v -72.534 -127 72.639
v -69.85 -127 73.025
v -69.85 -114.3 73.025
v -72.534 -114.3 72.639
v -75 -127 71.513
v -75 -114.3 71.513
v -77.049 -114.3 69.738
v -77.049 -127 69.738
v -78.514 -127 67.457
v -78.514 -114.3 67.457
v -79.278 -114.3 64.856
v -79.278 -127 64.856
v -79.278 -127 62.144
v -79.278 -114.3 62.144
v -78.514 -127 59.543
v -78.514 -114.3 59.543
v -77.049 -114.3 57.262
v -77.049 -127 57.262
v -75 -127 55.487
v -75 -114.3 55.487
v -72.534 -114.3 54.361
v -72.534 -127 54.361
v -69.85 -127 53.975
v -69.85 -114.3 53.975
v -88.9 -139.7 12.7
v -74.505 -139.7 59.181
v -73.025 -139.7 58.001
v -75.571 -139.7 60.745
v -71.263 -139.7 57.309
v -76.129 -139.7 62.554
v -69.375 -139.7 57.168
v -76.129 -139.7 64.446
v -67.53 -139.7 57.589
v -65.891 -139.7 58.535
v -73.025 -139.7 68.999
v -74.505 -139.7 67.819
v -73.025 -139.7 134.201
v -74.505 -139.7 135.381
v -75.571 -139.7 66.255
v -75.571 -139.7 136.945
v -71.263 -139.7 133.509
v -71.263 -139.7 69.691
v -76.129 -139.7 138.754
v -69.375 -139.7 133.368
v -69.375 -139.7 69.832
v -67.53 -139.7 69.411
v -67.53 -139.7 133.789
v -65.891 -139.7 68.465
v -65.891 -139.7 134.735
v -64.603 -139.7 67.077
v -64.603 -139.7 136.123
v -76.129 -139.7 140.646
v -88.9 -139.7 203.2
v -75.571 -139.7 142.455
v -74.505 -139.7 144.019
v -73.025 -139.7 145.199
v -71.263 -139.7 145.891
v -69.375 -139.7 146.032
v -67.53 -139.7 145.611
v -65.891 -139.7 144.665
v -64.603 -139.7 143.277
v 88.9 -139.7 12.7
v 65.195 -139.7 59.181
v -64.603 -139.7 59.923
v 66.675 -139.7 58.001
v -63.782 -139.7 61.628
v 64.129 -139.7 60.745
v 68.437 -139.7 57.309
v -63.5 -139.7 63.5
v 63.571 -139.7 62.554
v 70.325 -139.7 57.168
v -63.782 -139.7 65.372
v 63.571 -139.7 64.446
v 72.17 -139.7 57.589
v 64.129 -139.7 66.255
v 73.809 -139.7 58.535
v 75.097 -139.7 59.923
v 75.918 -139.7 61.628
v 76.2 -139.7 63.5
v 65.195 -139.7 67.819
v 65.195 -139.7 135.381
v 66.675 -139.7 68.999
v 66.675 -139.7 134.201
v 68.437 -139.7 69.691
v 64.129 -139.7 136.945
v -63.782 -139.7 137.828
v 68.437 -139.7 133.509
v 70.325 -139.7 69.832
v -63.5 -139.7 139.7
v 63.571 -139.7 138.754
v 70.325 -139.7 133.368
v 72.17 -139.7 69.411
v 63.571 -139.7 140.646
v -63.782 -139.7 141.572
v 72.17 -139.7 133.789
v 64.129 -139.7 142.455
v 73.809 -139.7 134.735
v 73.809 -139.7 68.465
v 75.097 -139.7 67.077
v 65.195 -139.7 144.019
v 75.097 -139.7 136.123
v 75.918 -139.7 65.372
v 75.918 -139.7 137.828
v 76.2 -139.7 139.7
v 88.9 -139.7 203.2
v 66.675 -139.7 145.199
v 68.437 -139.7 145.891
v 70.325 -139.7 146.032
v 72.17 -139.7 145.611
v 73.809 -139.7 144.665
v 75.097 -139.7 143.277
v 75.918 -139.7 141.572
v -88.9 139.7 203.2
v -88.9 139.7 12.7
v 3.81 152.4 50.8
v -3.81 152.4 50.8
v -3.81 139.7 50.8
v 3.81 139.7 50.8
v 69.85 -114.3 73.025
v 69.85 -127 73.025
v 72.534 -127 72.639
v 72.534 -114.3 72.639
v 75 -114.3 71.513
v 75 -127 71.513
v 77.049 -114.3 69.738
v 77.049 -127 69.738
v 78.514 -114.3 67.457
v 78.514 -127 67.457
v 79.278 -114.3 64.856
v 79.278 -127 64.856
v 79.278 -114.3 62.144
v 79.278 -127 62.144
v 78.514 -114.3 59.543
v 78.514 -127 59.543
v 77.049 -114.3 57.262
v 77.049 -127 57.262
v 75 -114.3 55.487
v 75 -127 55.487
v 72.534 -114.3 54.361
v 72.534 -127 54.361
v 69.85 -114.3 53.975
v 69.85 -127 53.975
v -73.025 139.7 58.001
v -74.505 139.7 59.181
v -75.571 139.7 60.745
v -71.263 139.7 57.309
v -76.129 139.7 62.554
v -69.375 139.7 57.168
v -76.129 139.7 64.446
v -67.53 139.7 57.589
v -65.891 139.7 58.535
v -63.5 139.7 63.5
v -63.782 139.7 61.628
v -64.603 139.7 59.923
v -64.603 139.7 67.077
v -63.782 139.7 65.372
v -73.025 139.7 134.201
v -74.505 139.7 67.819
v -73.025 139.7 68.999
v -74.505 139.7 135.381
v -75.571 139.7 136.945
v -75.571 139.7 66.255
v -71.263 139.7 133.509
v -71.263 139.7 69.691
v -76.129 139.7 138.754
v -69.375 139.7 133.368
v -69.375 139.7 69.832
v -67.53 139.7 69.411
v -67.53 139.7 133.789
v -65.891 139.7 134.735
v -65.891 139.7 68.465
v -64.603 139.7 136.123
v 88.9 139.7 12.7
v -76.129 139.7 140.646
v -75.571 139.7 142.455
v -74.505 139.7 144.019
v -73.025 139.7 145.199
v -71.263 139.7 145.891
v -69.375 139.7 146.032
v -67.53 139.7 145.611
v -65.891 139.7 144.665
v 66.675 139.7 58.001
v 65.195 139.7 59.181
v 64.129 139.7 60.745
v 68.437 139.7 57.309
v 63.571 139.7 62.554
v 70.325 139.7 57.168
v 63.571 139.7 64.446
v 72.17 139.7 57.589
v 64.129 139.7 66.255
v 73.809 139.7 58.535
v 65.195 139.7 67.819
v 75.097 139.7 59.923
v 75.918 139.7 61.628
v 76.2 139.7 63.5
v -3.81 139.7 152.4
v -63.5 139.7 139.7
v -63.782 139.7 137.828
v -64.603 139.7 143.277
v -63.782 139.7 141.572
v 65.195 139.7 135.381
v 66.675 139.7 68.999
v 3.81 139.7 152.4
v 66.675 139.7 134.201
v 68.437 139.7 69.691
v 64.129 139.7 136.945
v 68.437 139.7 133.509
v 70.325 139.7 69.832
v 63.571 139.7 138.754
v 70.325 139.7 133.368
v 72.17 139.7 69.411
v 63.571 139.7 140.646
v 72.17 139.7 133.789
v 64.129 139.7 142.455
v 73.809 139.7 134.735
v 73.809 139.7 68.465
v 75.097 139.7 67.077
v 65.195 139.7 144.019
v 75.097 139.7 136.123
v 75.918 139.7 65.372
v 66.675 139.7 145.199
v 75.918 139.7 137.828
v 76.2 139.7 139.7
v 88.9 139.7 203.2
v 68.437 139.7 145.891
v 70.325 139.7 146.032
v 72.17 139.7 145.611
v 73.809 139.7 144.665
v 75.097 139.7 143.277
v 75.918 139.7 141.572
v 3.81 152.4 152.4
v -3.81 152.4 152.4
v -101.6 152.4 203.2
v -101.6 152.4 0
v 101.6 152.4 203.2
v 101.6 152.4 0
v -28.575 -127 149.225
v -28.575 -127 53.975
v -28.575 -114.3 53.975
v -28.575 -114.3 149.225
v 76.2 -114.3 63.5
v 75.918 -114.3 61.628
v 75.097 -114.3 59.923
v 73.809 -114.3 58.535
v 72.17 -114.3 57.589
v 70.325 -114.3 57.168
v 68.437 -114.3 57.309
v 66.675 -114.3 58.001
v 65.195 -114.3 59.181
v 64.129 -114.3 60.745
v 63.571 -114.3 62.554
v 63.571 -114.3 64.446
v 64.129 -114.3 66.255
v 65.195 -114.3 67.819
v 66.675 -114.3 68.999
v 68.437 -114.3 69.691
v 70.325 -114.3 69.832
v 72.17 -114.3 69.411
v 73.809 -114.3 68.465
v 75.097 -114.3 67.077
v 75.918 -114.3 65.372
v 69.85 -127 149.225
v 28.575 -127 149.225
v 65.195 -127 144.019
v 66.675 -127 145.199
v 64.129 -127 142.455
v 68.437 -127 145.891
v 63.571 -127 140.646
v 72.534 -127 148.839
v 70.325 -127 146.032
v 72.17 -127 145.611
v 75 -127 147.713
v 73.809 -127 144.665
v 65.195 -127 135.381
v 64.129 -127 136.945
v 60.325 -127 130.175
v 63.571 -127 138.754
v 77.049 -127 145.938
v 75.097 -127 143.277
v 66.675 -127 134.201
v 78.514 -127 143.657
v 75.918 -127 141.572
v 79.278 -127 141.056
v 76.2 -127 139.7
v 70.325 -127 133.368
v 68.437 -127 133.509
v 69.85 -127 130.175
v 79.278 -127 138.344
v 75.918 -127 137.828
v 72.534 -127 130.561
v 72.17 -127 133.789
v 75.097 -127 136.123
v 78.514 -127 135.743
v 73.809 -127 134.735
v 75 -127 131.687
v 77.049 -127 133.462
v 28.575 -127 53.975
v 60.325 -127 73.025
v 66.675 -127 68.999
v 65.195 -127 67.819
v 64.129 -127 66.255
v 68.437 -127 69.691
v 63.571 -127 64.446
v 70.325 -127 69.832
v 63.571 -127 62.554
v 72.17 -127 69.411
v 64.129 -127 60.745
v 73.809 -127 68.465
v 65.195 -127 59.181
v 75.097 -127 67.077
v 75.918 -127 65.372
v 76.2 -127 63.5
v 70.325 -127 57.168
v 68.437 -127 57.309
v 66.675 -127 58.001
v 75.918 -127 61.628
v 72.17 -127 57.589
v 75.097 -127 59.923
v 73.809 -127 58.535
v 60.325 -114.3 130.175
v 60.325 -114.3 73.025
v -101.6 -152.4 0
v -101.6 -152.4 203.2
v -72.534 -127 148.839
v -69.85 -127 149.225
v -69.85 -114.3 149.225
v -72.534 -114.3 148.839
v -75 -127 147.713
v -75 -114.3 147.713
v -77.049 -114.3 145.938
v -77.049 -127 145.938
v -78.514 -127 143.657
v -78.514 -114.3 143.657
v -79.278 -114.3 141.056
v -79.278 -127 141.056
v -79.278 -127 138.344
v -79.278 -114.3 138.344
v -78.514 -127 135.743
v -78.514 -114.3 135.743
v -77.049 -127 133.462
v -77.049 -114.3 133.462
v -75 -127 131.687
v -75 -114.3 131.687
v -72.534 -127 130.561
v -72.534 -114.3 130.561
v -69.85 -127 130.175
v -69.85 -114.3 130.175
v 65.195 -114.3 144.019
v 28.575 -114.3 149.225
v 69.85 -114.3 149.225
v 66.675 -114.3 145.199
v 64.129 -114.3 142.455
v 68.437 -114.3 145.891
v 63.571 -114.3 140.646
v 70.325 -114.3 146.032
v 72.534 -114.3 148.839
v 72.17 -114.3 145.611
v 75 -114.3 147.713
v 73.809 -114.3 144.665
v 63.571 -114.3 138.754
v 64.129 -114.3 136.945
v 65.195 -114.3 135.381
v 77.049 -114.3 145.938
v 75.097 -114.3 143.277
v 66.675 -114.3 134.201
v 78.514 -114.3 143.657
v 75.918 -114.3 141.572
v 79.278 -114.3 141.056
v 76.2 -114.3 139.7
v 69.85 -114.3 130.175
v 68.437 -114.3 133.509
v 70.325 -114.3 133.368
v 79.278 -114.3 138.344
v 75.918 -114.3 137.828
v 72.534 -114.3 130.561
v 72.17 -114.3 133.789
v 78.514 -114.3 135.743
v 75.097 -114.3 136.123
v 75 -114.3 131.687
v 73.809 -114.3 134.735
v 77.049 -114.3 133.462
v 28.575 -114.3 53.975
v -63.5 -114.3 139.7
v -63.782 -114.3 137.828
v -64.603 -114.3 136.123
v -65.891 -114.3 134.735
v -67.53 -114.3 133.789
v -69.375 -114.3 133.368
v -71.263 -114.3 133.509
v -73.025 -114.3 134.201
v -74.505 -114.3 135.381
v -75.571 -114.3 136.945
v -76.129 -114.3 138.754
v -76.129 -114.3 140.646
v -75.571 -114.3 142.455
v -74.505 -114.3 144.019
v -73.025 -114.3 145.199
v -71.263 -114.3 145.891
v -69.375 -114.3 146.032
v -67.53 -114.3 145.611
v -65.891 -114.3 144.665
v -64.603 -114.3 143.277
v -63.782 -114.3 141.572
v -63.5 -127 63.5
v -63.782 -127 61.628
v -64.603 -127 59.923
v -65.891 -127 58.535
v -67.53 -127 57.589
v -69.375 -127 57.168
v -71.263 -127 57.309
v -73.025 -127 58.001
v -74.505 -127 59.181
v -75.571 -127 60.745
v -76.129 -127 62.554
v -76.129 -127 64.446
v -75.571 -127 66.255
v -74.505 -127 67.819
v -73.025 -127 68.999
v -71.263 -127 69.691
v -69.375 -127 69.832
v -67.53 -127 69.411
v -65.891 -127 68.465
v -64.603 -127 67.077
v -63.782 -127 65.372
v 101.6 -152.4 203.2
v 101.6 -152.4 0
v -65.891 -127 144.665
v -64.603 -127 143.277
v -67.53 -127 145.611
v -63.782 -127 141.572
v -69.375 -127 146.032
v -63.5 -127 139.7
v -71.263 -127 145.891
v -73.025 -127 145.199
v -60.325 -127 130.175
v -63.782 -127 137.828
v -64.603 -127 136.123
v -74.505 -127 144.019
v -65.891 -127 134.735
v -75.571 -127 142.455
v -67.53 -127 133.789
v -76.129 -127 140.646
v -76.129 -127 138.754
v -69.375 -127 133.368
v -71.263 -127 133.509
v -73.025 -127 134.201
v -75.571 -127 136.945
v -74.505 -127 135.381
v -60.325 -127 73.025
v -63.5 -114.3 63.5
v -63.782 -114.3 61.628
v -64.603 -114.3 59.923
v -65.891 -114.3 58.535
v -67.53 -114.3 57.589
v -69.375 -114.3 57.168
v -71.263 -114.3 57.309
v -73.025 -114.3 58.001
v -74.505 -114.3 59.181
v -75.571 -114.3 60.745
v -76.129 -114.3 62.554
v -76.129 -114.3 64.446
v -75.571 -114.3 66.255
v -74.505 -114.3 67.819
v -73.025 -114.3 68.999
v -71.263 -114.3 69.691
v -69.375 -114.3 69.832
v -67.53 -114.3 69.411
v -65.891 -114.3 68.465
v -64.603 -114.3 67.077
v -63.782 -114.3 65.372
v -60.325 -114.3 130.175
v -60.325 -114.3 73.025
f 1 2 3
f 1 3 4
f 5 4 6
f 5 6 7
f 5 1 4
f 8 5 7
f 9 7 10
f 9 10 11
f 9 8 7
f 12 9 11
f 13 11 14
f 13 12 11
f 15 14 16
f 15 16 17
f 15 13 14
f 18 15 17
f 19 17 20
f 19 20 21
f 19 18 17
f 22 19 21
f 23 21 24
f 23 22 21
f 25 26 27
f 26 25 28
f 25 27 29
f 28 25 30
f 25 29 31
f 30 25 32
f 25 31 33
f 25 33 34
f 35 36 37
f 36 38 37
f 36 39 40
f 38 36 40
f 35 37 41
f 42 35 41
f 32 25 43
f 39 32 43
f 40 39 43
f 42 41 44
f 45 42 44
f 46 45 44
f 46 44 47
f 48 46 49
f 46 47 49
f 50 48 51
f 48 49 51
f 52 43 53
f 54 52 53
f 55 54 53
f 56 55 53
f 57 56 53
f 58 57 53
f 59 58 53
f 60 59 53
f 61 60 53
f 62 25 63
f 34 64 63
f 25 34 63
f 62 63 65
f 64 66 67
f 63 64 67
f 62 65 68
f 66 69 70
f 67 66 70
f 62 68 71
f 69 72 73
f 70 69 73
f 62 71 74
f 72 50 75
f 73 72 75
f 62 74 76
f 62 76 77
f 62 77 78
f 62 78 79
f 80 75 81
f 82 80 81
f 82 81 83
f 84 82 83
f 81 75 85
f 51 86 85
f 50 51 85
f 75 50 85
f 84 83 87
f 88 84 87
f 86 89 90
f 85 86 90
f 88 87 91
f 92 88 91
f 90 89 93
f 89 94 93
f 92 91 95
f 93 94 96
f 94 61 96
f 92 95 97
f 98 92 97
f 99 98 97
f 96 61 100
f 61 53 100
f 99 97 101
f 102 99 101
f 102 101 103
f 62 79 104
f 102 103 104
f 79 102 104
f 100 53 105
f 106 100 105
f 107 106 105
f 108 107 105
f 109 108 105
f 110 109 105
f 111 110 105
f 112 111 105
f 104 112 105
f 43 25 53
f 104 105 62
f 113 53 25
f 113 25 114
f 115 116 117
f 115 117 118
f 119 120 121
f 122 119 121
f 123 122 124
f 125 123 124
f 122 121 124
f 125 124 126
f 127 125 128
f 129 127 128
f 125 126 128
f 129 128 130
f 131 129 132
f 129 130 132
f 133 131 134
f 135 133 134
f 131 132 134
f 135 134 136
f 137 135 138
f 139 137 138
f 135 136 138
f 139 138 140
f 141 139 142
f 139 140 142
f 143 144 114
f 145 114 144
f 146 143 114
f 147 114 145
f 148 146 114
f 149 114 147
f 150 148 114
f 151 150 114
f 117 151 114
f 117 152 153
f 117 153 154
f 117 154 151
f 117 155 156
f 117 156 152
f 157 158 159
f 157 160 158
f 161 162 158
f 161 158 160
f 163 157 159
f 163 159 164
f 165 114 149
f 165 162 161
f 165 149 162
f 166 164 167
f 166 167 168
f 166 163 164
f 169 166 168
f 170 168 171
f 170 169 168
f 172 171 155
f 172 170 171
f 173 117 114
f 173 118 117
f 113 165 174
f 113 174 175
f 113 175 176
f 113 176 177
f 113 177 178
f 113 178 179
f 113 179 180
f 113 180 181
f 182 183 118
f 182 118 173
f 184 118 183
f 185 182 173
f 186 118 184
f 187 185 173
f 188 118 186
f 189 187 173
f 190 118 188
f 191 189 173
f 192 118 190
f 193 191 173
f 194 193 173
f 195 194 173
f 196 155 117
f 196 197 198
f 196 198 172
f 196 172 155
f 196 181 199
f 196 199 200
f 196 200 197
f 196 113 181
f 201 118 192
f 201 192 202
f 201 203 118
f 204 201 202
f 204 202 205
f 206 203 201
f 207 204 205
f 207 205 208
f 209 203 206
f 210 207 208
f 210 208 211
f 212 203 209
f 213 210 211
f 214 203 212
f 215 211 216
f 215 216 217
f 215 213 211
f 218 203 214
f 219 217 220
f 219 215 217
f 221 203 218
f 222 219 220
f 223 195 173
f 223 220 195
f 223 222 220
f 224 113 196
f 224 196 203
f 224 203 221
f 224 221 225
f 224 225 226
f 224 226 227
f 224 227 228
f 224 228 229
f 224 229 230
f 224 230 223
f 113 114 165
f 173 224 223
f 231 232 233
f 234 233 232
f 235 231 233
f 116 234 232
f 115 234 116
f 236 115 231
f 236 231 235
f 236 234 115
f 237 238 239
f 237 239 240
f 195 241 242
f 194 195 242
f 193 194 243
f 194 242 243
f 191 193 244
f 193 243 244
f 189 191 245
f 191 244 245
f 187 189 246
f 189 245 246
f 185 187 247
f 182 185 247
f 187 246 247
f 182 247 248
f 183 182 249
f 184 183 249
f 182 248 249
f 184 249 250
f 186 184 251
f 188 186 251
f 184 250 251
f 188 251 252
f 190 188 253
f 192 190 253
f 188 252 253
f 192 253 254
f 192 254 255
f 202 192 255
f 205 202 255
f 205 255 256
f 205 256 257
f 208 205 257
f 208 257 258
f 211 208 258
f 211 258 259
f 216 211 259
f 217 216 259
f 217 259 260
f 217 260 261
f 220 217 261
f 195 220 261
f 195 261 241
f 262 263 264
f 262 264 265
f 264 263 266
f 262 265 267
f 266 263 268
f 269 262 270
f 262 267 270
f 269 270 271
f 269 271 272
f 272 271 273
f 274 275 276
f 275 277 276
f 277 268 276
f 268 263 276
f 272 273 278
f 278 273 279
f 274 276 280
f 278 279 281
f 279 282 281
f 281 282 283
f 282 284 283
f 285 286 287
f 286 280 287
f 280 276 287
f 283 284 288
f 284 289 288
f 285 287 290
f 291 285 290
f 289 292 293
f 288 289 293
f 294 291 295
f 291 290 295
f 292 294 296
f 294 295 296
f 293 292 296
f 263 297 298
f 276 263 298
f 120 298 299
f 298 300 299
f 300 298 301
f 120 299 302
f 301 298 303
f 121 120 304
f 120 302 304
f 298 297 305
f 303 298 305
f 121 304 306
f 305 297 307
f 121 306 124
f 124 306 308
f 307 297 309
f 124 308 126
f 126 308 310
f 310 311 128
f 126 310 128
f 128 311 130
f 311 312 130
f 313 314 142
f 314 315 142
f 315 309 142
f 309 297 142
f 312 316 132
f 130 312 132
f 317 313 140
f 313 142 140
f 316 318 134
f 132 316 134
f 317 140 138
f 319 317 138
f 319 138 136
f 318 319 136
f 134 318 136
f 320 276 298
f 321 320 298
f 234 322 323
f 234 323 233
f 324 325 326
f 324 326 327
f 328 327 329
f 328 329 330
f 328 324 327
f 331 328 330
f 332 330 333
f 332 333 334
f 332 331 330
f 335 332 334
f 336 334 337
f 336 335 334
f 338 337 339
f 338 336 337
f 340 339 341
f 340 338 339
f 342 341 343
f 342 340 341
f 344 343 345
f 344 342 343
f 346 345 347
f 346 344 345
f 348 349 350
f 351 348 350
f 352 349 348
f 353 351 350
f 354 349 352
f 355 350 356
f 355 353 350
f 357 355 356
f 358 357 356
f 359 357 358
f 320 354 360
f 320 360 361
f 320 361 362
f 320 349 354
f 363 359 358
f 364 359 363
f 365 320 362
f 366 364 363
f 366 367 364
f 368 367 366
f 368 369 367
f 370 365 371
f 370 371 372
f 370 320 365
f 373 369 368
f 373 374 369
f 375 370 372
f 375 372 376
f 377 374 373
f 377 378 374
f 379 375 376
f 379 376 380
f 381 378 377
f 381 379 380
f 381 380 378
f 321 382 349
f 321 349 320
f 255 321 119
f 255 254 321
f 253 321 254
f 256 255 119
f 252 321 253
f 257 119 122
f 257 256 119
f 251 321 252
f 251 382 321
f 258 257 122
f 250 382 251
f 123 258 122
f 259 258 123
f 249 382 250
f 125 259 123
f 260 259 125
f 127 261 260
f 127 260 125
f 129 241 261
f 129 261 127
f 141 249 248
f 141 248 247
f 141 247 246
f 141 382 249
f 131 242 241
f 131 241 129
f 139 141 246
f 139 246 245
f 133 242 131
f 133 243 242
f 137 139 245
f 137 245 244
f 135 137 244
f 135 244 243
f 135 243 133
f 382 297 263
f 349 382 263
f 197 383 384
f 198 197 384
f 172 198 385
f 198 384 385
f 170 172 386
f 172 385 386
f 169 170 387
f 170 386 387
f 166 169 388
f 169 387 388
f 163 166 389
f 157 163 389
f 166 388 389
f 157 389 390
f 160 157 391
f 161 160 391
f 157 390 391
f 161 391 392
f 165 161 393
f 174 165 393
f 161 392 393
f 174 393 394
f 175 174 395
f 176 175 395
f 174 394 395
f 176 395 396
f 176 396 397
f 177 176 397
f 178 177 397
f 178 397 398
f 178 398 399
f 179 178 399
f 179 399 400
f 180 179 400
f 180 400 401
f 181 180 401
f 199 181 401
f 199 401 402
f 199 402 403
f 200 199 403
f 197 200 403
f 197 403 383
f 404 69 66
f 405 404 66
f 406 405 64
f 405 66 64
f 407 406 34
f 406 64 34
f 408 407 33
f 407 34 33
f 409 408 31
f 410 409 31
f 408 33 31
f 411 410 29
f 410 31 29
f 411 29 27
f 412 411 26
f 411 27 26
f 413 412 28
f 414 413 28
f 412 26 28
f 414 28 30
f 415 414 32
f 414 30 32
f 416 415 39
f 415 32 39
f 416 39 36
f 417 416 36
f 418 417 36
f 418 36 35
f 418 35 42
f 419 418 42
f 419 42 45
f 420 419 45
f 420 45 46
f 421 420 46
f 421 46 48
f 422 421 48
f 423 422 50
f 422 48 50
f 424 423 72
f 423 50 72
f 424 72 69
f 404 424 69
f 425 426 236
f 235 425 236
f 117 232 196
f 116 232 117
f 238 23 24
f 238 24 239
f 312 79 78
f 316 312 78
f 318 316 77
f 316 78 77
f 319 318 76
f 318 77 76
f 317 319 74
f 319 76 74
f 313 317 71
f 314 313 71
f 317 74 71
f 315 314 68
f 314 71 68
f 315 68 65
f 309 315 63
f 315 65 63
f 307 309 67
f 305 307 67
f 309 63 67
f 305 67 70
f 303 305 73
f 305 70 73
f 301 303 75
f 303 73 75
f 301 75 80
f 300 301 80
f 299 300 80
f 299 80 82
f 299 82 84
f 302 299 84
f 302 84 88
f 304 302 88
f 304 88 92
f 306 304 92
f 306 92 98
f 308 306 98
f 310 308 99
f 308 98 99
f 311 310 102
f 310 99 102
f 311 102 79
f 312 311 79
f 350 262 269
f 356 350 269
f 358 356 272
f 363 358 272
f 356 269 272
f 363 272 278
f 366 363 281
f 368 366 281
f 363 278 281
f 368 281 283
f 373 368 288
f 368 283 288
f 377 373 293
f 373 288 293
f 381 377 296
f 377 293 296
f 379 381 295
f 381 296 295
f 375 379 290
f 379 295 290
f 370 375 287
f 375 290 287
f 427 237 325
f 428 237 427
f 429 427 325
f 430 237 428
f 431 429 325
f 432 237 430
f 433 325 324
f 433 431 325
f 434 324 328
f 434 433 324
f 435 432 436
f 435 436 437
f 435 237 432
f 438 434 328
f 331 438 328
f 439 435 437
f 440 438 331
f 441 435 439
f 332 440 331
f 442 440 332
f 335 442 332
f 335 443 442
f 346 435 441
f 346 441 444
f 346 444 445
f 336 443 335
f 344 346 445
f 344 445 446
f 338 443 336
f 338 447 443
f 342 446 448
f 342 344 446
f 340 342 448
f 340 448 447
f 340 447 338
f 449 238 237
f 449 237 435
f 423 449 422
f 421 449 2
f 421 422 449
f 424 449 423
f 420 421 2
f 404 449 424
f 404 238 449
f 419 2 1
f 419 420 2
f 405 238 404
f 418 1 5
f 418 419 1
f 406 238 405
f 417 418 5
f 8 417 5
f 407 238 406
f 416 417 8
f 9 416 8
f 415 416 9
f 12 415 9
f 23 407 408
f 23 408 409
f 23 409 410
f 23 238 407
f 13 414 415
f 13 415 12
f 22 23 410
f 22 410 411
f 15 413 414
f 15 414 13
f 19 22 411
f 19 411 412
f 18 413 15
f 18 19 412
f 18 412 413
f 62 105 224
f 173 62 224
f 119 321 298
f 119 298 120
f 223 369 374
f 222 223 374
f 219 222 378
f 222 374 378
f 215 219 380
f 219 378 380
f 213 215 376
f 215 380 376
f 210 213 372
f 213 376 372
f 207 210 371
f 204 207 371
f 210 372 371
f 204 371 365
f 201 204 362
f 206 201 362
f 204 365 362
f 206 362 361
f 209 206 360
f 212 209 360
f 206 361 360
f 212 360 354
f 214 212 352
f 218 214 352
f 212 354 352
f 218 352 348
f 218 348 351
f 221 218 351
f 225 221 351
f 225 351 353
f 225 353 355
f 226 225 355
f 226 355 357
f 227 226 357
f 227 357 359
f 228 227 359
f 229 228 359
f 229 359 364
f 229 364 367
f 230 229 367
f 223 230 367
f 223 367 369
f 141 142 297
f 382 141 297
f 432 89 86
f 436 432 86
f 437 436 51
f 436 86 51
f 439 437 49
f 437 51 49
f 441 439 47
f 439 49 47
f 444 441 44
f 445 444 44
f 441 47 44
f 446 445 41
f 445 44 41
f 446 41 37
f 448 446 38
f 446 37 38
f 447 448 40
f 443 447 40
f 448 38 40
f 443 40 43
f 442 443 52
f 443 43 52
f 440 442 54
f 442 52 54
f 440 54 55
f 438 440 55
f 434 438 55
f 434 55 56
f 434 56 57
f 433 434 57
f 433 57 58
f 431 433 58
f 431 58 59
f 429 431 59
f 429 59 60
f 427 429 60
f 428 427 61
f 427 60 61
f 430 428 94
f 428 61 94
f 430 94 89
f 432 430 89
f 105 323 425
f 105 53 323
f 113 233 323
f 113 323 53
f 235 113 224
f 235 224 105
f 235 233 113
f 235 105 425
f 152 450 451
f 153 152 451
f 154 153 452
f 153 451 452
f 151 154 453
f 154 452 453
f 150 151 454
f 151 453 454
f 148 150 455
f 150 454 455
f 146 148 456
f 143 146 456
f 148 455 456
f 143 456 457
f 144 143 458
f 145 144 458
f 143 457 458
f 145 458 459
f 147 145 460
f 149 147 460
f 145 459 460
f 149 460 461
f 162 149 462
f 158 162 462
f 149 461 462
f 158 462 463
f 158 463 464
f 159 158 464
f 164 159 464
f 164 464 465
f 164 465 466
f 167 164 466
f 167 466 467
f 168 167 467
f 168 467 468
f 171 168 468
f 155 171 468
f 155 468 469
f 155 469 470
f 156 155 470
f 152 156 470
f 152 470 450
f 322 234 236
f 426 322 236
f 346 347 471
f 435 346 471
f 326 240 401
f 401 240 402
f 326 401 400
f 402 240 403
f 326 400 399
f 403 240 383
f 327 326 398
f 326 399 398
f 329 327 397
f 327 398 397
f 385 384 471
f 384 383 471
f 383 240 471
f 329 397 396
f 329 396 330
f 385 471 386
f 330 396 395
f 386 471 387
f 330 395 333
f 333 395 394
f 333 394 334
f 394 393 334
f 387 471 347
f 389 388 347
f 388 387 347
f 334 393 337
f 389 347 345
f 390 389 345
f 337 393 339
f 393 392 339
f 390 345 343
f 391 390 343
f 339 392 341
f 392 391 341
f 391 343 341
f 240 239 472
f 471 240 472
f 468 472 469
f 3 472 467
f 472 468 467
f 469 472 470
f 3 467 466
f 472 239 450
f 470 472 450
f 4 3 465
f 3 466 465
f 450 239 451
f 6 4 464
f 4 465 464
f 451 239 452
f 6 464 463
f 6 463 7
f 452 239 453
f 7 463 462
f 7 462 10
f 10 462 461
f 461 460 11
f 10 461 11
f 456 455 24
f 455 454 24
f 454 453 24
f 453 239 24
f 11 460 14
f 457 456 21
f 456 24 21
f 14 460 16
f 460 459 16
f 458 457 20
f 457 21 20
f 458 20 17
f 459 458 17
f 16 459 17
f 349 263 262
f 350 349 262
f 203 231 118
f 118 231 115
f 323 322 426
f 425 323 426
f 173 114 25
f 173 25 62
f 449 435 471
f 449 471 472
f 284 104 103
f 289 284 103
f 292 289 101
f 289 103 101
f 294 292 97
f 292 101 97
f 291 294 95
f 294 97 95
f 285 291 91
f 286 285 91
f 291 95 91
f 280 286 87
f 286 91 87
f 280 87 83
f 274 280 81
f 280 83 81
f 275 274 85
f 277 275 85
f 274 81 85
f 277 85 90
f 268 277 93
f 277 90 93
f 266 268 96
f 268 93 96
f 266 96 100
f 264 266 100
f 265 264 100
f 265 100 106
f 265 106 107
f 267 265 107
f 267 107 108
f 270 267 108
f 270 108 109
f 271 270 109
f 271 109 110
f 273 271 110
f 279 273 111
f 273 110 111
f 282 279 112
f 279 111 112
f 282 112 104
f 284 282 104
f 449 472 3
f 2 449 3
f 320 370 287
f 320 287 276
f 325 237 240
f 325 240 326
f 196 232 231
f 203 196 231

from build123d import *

# Parameters (mm, degrees)
SKETCH1_W           = 203.2
SKETCH1_H           = 304.8
BOSS_EXTRUDE1_DEPTH = 203.2
SKETCH2_W           = 177.8
SKETCH2_H           = 279.4
CUT_EXTRUDE1_DEPTH  = 190.5
SKETCH3_W           = 7.62
SKETCH3_H           = 101.6
CUT_EXTRUDE2_DEPTH  = 190.5
SKETCH4_R           = 6.35
BOSS_EXTRUDE2_DEPTH = 279.4
BOSS_EXTRUDE3_DEPTH = 25.4
CUT_EXTRUDE3_DEPTH  = 12.7
SKETCH4_2_R         = 6.35
BOSS_EXTRUDE5_DEPTH = 12.7


with BuildPart() as part:
    # Sketch1 → Boss-Extrude1 (new body)
    with BuildSketch(Plane.XY):
        Rectangle(SKETCH1_W, SKETCH1_H)
    extrude(amount=BOSS_EXTRUDE1_DEPTH)

    # Sketch2 → Cut-Extrude1 (cut)
    with BuildSketch(Plane.XY.offset(203.2)):
        Rectangle(SKETCH2_W, SKETCH2_H)
    extrude(amount=-CUT_EXTRUDE1_DEPTH, mode=Mode.SUBTRACT)

    # Sketch3 → Cut-Extrude2 (cut)
    with BuildSketch(Plane(origin=(0, 152.4, 0), x_dir=(1, 0, 0), z_dir=(0, 1, 0))):
        with Locations((0, -101.6)):
            Rectangle(SKETCH3_W, SKETCH3_H)
    extrude(amount=-CUT_EXTRUDE2_DEPTH, mode=Mode.SUBTRACT)

    # Sketch4 → Boss-Extrude2 (add)
    with BuildSketch(Plane(origin=(0, -139.7, 0), x_dir=(1, 0, 0), z_dir=(0, 1, 0))):
        with Locations((-69.85, -63.5)):
            Circle(SKETCH4_R)
        with Locations((69.85, -63.5)):
            Circle(SKETCH4_R)
        with Locations((69.85, -139.7)):
            Circle(SKETCH4_R)
        with Locations((-69.85, -139.7)):
            Circle(SKETCH4_R)
    extrude(amount=BOSS_EXTRUDE2_DEPTH)

    # Sketch7 → Boss-Extrude3 (add)
    with BuildSketch(Plane(origin=(0, -139.7, 0), x_dir=(1, 0, 0), z_dir=(0, 1, 0))):
        with BuildLine():
            Line((-69.85, -53.975), (-60.325, -53.975))
            Line((-60.325, -53.975), (-28.575, -53.975))
            Line((-28.575, -53.975), (-28.575, -149.225))
            Line((-28.575, -149.225), (-60.325, -149.225))
            Line((-60.325, -149.225), (-69.85, -149.225))
            ThreePointArc((-69.85, -149.225), (-79.375, -139.7), (-69.85, -130.175))
            Line((-69.85, -130.175), (-60.325, -130.175))
            Line((-60.325, -130.175), (-60.325, -73.025))
            Line((-60.325, -73.025), (-69.85, -73.025))
            ThreePointArc((-69.85, -73.025), (-79.375, -63.5), (-69.85, -53.975))
        make_face()
        with BuildLine():
            Line((60.325, -53.975), (28.575, -53.975))
            Line((28.575, -53.975), (28.575, -149.225))
            Line((28.575, -149.225), (60.325, -149.225))
            Line((60.325, -149.225), (69.85, -149.225))
            ThreePointArc((69.85, -149.225), (79.375, -139.7), (69.85, -130.175))
            Line((69.85, -130.175), (60.325, -130.175))
            Line((60.325, -130.175), (60.325, -73.025))
            Line((60.325, -73.025), (69.85, -73.025))
            ThreePointArc((69.85, -73.025), (79.375, -63.5), (69.85, -53.975))
            Line((69.85, -53.975), (60.325, -53.975))
        make_face()
    extrude(amount=BOSS_EXTRUDE3_DEPTH)

    # Sketch7_4 → Cut-Extrude3 (cut)
    with BuildSketch(Plane(origin=(0, -139.7, 0), x_dir=(1, 0, 0), z_dir=(0, 1, 0))):
        with BuildLine():
            Line((-69.85, -53.975), (-60.325, -53.975))
            Line((-60.325, -53.975), (-28.575, -53.975))
            Line((-28.575, -53.975), (-28.575, -149.225))
            Line((-28.575, -149.225), (-60.325, -149.225))
            Line((-60.325, -149.225), (-69.85, -149.225))
            ThreePointArc((-69.85, -149.225), (-79.375, -139.7), (-69.85, -130.175))
            Line((-69.85, -130.175), (-60.325, -130.175))
            Line((-60.325, -130.175), (-60.325, -73.025))
            Line((-60.325, -73.025), (-69.85, -73.025))
            ThreePointArc((-69.85, -73.025), (-79.375, -63.5), (-69.85, -53.975))
        make_face()
        with BuildLine():
            Line((60.325, -53.975), (28.575, -53.975))
            Line((28.575, -53.975), (28.575, -149.225))
            Line((28.575, -149.225), (60.325, -149.225))
            Line((60.325, -149.225), (69.85, -149.225))
            ThreePointArc((69.85, -149.225), (79.375, -139.7), (69.85, -130.175))
            Line((69.85, -130.175), (60.325, -130.175))
            Line((60.325, -130.175), (60.325, -73.025))
            Line((60.325, -73.025), (69.85, -73.025))
            ThreePointArc((69.85, -73.025), (79.375, -63.5), (69.85, -53.975))
            Line((69.85, -53.975), (60.325, -53.975))
        make_face()
    extrude(amount=CUT_EXTRUDE3_DEPTH, mode=Mode.SUBTRACT)

    # Sketch4_2 → Boss-Extrude5 (add)
    with BuildSketch(Plane(origin=(0, -139.7, 0), x_dir=(1, 0, 0), z_dir=(0, 1, 0))):
        with Locations((-69.85, -63.5)):
            Circle(SKETCH4_2_R)
        with Locations((69.85, -63.5)):
            Circle(SKETCH4_2_R)
        with Locations((69.85, -139.7)):
            Circle(SKETCH4_2_R)
        with Locations((-69.85, -139.7)):
            Circle(SKETCH4_2_R)
    extrude(amount=BOSS_EXTRUDE5_DEPTH)


solid = part.part
